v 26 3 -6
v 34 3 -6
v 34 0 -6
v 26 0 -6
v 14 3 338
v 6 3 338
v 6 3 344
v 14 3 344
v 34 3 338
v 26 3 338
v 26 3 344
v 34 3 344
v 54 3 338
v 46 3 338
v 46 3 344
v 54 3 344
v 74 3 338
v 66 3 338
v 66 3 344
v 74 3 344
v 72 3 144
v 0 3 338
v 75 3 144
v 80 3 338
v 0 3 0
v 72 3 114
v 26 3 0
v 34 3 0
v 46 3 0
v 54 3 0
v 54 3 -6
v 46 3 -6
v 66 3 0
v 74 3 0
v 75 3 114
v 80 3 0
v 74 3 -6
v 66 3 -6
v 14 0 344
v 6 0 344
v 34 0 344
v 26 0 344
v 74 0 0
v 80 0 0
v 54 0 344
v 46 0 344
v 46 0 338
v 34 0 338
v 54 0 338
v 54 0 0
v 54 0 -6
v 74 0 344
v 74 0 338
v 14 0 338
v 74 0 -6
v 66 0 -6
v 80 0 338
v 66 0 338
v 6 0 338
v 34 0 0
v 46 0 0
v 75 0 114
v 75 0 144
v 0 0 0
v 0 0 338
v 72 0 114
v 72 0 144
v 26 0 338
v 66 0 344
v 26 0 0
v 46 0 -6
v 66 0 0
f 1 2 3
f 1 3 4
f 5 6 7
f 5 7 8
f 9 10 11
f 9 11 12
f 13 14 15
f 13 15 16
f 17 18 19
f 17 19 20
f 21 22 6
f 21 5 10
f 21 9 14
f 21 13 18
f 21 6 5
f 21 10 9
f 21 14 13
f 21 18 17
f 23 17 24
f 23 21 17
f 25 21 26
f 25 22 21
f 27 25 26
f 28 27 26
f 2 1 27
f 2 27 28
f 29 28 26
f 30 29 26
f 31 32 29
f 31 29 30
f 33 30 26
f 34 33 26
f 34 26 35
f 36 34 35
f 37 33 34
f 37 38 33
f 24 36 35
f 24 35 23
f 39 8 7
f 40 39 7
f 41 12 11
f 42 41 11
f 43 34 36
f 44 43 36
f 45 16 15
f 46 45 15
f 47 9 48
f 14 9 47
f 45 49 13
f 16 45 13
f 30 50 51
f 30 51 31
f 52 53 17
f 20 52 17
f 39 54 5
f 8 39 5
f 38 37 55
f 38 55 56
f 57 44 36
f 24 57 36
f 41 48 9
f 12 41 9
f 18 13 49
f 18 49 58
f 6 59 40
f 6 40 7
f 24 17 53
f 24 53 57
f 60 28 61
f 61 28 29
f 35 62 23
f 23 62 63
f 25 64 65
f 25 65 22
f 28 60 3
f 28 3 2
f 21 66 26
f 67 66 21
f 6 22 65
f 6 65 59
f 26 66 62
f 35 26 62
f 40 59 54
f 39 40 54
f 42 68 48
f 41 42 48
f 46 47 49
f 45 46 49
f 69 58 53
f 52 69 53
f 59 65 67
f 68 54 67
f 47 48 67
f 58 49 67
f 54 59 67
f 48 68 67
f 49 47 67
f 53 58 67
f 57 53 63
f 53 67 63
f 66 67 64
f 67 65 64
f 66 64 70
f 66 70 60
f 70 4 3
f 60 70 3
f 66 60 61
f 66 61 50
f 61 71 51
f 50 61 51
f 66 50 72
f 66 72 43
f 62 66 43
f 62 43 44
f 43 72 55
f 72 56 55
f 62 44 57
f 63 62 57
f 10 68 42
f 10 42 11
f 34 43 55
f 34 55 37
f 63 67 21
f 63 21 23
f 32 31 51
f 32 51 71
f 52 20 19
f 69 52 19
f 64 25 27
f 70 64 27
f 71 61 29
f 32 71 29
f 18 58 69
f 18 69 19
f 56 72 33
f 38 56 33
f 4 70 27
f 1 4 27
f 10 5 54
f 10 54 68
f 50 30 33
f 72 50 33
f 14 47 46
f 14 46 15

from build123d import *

# Parameters (mm, degrees)
ESQUISSE1_W             = 80
ESQUISSE1_H             = 3
BOSS_EXTRU_1_DEPTH      = 338
ESQUISSE3_W             = 8
ESQUISSE3_H             = 3
BOSS_EXTRU_2_DEPTH      = 6
ESQUISSE4_W             = 8
ESQUISSE4_H             = 6
ENL_V_MAT_EXTRU_2_DEPTH = 6
ESQUISSE5_W             = 3
ESQUISSE5_H             = 30
ENL_V_MAT_EXTRU_3_DEPTH = 3


with BuildPart() as part:
    # Esquisse1 → Boss.-Extru.1 (new body)
    with BuildSketch(Plane.XY):
        with Locations((40, 1.5)):
            Rectangle(ESQUISSE1_W, ESQUISSE1_H)
    extrude(amount=BOSS_EXTRU_1_DEPTH)

    # Esquisse3 → Boss.-Extru.2 (add)
    with BuildSketch(Plane(origin=(0, 0, 0), x_dir=(-1, 0, 0), z_dir=(0, 0, -1))):
        with Locations((-10, 1.5)):
            Rectangle(ESQUISSE3_W, ESQUISSE3_H)
        with Locations((-30, 1.5)):
            Rectangle(ESQUISSE3_W, ESQUISSE3_H)
        with Locations((-50, 1.5)):
            Rectangle(ESQUISSE3_W, ESQUISSE3_H)
        with Locations((-70, 1.5)):
            Rectangle(ESQUISSE3_W, ESQUISSE3_H)
    boss_extru_2 = extrude(amount=BOSS_EXTRU_2_DEPTH)

    # Symétrie1: Boss.-Extru.2 across plane
    add(boss_extru_2.mirror(Plane(origin=(0, 0, 169), x_dir=(1, 0, 0), z_dir=(0, 0, -1))))

    # Esquisse4 → Enlèv. mat.-Extru.2 (cut)
    with BuildSketch(Plane.XZ):
        with Locations((10, -3)):
            Rectangle(ESQUISSE4_W, ESQUISSE4_H)
    extrude(amount=-ENL_V_MAT_EXTRU_2_DEPTH, mode=Mode.SUBTRACT)

    # Esquisse5 → Enlèv. mat.-Extru.3 (cut)
    with BuildSketch(Plane.XZ):
        with Locations((73.5, 129)):
            Rectangle(ESQUISSE5_W, ESQUISSE5_H)
    extrude(amount=-ENL_V_MAT_EXTRU_3_DEPTH, mode=Mode.SUBTRACT)


solid = part.part
